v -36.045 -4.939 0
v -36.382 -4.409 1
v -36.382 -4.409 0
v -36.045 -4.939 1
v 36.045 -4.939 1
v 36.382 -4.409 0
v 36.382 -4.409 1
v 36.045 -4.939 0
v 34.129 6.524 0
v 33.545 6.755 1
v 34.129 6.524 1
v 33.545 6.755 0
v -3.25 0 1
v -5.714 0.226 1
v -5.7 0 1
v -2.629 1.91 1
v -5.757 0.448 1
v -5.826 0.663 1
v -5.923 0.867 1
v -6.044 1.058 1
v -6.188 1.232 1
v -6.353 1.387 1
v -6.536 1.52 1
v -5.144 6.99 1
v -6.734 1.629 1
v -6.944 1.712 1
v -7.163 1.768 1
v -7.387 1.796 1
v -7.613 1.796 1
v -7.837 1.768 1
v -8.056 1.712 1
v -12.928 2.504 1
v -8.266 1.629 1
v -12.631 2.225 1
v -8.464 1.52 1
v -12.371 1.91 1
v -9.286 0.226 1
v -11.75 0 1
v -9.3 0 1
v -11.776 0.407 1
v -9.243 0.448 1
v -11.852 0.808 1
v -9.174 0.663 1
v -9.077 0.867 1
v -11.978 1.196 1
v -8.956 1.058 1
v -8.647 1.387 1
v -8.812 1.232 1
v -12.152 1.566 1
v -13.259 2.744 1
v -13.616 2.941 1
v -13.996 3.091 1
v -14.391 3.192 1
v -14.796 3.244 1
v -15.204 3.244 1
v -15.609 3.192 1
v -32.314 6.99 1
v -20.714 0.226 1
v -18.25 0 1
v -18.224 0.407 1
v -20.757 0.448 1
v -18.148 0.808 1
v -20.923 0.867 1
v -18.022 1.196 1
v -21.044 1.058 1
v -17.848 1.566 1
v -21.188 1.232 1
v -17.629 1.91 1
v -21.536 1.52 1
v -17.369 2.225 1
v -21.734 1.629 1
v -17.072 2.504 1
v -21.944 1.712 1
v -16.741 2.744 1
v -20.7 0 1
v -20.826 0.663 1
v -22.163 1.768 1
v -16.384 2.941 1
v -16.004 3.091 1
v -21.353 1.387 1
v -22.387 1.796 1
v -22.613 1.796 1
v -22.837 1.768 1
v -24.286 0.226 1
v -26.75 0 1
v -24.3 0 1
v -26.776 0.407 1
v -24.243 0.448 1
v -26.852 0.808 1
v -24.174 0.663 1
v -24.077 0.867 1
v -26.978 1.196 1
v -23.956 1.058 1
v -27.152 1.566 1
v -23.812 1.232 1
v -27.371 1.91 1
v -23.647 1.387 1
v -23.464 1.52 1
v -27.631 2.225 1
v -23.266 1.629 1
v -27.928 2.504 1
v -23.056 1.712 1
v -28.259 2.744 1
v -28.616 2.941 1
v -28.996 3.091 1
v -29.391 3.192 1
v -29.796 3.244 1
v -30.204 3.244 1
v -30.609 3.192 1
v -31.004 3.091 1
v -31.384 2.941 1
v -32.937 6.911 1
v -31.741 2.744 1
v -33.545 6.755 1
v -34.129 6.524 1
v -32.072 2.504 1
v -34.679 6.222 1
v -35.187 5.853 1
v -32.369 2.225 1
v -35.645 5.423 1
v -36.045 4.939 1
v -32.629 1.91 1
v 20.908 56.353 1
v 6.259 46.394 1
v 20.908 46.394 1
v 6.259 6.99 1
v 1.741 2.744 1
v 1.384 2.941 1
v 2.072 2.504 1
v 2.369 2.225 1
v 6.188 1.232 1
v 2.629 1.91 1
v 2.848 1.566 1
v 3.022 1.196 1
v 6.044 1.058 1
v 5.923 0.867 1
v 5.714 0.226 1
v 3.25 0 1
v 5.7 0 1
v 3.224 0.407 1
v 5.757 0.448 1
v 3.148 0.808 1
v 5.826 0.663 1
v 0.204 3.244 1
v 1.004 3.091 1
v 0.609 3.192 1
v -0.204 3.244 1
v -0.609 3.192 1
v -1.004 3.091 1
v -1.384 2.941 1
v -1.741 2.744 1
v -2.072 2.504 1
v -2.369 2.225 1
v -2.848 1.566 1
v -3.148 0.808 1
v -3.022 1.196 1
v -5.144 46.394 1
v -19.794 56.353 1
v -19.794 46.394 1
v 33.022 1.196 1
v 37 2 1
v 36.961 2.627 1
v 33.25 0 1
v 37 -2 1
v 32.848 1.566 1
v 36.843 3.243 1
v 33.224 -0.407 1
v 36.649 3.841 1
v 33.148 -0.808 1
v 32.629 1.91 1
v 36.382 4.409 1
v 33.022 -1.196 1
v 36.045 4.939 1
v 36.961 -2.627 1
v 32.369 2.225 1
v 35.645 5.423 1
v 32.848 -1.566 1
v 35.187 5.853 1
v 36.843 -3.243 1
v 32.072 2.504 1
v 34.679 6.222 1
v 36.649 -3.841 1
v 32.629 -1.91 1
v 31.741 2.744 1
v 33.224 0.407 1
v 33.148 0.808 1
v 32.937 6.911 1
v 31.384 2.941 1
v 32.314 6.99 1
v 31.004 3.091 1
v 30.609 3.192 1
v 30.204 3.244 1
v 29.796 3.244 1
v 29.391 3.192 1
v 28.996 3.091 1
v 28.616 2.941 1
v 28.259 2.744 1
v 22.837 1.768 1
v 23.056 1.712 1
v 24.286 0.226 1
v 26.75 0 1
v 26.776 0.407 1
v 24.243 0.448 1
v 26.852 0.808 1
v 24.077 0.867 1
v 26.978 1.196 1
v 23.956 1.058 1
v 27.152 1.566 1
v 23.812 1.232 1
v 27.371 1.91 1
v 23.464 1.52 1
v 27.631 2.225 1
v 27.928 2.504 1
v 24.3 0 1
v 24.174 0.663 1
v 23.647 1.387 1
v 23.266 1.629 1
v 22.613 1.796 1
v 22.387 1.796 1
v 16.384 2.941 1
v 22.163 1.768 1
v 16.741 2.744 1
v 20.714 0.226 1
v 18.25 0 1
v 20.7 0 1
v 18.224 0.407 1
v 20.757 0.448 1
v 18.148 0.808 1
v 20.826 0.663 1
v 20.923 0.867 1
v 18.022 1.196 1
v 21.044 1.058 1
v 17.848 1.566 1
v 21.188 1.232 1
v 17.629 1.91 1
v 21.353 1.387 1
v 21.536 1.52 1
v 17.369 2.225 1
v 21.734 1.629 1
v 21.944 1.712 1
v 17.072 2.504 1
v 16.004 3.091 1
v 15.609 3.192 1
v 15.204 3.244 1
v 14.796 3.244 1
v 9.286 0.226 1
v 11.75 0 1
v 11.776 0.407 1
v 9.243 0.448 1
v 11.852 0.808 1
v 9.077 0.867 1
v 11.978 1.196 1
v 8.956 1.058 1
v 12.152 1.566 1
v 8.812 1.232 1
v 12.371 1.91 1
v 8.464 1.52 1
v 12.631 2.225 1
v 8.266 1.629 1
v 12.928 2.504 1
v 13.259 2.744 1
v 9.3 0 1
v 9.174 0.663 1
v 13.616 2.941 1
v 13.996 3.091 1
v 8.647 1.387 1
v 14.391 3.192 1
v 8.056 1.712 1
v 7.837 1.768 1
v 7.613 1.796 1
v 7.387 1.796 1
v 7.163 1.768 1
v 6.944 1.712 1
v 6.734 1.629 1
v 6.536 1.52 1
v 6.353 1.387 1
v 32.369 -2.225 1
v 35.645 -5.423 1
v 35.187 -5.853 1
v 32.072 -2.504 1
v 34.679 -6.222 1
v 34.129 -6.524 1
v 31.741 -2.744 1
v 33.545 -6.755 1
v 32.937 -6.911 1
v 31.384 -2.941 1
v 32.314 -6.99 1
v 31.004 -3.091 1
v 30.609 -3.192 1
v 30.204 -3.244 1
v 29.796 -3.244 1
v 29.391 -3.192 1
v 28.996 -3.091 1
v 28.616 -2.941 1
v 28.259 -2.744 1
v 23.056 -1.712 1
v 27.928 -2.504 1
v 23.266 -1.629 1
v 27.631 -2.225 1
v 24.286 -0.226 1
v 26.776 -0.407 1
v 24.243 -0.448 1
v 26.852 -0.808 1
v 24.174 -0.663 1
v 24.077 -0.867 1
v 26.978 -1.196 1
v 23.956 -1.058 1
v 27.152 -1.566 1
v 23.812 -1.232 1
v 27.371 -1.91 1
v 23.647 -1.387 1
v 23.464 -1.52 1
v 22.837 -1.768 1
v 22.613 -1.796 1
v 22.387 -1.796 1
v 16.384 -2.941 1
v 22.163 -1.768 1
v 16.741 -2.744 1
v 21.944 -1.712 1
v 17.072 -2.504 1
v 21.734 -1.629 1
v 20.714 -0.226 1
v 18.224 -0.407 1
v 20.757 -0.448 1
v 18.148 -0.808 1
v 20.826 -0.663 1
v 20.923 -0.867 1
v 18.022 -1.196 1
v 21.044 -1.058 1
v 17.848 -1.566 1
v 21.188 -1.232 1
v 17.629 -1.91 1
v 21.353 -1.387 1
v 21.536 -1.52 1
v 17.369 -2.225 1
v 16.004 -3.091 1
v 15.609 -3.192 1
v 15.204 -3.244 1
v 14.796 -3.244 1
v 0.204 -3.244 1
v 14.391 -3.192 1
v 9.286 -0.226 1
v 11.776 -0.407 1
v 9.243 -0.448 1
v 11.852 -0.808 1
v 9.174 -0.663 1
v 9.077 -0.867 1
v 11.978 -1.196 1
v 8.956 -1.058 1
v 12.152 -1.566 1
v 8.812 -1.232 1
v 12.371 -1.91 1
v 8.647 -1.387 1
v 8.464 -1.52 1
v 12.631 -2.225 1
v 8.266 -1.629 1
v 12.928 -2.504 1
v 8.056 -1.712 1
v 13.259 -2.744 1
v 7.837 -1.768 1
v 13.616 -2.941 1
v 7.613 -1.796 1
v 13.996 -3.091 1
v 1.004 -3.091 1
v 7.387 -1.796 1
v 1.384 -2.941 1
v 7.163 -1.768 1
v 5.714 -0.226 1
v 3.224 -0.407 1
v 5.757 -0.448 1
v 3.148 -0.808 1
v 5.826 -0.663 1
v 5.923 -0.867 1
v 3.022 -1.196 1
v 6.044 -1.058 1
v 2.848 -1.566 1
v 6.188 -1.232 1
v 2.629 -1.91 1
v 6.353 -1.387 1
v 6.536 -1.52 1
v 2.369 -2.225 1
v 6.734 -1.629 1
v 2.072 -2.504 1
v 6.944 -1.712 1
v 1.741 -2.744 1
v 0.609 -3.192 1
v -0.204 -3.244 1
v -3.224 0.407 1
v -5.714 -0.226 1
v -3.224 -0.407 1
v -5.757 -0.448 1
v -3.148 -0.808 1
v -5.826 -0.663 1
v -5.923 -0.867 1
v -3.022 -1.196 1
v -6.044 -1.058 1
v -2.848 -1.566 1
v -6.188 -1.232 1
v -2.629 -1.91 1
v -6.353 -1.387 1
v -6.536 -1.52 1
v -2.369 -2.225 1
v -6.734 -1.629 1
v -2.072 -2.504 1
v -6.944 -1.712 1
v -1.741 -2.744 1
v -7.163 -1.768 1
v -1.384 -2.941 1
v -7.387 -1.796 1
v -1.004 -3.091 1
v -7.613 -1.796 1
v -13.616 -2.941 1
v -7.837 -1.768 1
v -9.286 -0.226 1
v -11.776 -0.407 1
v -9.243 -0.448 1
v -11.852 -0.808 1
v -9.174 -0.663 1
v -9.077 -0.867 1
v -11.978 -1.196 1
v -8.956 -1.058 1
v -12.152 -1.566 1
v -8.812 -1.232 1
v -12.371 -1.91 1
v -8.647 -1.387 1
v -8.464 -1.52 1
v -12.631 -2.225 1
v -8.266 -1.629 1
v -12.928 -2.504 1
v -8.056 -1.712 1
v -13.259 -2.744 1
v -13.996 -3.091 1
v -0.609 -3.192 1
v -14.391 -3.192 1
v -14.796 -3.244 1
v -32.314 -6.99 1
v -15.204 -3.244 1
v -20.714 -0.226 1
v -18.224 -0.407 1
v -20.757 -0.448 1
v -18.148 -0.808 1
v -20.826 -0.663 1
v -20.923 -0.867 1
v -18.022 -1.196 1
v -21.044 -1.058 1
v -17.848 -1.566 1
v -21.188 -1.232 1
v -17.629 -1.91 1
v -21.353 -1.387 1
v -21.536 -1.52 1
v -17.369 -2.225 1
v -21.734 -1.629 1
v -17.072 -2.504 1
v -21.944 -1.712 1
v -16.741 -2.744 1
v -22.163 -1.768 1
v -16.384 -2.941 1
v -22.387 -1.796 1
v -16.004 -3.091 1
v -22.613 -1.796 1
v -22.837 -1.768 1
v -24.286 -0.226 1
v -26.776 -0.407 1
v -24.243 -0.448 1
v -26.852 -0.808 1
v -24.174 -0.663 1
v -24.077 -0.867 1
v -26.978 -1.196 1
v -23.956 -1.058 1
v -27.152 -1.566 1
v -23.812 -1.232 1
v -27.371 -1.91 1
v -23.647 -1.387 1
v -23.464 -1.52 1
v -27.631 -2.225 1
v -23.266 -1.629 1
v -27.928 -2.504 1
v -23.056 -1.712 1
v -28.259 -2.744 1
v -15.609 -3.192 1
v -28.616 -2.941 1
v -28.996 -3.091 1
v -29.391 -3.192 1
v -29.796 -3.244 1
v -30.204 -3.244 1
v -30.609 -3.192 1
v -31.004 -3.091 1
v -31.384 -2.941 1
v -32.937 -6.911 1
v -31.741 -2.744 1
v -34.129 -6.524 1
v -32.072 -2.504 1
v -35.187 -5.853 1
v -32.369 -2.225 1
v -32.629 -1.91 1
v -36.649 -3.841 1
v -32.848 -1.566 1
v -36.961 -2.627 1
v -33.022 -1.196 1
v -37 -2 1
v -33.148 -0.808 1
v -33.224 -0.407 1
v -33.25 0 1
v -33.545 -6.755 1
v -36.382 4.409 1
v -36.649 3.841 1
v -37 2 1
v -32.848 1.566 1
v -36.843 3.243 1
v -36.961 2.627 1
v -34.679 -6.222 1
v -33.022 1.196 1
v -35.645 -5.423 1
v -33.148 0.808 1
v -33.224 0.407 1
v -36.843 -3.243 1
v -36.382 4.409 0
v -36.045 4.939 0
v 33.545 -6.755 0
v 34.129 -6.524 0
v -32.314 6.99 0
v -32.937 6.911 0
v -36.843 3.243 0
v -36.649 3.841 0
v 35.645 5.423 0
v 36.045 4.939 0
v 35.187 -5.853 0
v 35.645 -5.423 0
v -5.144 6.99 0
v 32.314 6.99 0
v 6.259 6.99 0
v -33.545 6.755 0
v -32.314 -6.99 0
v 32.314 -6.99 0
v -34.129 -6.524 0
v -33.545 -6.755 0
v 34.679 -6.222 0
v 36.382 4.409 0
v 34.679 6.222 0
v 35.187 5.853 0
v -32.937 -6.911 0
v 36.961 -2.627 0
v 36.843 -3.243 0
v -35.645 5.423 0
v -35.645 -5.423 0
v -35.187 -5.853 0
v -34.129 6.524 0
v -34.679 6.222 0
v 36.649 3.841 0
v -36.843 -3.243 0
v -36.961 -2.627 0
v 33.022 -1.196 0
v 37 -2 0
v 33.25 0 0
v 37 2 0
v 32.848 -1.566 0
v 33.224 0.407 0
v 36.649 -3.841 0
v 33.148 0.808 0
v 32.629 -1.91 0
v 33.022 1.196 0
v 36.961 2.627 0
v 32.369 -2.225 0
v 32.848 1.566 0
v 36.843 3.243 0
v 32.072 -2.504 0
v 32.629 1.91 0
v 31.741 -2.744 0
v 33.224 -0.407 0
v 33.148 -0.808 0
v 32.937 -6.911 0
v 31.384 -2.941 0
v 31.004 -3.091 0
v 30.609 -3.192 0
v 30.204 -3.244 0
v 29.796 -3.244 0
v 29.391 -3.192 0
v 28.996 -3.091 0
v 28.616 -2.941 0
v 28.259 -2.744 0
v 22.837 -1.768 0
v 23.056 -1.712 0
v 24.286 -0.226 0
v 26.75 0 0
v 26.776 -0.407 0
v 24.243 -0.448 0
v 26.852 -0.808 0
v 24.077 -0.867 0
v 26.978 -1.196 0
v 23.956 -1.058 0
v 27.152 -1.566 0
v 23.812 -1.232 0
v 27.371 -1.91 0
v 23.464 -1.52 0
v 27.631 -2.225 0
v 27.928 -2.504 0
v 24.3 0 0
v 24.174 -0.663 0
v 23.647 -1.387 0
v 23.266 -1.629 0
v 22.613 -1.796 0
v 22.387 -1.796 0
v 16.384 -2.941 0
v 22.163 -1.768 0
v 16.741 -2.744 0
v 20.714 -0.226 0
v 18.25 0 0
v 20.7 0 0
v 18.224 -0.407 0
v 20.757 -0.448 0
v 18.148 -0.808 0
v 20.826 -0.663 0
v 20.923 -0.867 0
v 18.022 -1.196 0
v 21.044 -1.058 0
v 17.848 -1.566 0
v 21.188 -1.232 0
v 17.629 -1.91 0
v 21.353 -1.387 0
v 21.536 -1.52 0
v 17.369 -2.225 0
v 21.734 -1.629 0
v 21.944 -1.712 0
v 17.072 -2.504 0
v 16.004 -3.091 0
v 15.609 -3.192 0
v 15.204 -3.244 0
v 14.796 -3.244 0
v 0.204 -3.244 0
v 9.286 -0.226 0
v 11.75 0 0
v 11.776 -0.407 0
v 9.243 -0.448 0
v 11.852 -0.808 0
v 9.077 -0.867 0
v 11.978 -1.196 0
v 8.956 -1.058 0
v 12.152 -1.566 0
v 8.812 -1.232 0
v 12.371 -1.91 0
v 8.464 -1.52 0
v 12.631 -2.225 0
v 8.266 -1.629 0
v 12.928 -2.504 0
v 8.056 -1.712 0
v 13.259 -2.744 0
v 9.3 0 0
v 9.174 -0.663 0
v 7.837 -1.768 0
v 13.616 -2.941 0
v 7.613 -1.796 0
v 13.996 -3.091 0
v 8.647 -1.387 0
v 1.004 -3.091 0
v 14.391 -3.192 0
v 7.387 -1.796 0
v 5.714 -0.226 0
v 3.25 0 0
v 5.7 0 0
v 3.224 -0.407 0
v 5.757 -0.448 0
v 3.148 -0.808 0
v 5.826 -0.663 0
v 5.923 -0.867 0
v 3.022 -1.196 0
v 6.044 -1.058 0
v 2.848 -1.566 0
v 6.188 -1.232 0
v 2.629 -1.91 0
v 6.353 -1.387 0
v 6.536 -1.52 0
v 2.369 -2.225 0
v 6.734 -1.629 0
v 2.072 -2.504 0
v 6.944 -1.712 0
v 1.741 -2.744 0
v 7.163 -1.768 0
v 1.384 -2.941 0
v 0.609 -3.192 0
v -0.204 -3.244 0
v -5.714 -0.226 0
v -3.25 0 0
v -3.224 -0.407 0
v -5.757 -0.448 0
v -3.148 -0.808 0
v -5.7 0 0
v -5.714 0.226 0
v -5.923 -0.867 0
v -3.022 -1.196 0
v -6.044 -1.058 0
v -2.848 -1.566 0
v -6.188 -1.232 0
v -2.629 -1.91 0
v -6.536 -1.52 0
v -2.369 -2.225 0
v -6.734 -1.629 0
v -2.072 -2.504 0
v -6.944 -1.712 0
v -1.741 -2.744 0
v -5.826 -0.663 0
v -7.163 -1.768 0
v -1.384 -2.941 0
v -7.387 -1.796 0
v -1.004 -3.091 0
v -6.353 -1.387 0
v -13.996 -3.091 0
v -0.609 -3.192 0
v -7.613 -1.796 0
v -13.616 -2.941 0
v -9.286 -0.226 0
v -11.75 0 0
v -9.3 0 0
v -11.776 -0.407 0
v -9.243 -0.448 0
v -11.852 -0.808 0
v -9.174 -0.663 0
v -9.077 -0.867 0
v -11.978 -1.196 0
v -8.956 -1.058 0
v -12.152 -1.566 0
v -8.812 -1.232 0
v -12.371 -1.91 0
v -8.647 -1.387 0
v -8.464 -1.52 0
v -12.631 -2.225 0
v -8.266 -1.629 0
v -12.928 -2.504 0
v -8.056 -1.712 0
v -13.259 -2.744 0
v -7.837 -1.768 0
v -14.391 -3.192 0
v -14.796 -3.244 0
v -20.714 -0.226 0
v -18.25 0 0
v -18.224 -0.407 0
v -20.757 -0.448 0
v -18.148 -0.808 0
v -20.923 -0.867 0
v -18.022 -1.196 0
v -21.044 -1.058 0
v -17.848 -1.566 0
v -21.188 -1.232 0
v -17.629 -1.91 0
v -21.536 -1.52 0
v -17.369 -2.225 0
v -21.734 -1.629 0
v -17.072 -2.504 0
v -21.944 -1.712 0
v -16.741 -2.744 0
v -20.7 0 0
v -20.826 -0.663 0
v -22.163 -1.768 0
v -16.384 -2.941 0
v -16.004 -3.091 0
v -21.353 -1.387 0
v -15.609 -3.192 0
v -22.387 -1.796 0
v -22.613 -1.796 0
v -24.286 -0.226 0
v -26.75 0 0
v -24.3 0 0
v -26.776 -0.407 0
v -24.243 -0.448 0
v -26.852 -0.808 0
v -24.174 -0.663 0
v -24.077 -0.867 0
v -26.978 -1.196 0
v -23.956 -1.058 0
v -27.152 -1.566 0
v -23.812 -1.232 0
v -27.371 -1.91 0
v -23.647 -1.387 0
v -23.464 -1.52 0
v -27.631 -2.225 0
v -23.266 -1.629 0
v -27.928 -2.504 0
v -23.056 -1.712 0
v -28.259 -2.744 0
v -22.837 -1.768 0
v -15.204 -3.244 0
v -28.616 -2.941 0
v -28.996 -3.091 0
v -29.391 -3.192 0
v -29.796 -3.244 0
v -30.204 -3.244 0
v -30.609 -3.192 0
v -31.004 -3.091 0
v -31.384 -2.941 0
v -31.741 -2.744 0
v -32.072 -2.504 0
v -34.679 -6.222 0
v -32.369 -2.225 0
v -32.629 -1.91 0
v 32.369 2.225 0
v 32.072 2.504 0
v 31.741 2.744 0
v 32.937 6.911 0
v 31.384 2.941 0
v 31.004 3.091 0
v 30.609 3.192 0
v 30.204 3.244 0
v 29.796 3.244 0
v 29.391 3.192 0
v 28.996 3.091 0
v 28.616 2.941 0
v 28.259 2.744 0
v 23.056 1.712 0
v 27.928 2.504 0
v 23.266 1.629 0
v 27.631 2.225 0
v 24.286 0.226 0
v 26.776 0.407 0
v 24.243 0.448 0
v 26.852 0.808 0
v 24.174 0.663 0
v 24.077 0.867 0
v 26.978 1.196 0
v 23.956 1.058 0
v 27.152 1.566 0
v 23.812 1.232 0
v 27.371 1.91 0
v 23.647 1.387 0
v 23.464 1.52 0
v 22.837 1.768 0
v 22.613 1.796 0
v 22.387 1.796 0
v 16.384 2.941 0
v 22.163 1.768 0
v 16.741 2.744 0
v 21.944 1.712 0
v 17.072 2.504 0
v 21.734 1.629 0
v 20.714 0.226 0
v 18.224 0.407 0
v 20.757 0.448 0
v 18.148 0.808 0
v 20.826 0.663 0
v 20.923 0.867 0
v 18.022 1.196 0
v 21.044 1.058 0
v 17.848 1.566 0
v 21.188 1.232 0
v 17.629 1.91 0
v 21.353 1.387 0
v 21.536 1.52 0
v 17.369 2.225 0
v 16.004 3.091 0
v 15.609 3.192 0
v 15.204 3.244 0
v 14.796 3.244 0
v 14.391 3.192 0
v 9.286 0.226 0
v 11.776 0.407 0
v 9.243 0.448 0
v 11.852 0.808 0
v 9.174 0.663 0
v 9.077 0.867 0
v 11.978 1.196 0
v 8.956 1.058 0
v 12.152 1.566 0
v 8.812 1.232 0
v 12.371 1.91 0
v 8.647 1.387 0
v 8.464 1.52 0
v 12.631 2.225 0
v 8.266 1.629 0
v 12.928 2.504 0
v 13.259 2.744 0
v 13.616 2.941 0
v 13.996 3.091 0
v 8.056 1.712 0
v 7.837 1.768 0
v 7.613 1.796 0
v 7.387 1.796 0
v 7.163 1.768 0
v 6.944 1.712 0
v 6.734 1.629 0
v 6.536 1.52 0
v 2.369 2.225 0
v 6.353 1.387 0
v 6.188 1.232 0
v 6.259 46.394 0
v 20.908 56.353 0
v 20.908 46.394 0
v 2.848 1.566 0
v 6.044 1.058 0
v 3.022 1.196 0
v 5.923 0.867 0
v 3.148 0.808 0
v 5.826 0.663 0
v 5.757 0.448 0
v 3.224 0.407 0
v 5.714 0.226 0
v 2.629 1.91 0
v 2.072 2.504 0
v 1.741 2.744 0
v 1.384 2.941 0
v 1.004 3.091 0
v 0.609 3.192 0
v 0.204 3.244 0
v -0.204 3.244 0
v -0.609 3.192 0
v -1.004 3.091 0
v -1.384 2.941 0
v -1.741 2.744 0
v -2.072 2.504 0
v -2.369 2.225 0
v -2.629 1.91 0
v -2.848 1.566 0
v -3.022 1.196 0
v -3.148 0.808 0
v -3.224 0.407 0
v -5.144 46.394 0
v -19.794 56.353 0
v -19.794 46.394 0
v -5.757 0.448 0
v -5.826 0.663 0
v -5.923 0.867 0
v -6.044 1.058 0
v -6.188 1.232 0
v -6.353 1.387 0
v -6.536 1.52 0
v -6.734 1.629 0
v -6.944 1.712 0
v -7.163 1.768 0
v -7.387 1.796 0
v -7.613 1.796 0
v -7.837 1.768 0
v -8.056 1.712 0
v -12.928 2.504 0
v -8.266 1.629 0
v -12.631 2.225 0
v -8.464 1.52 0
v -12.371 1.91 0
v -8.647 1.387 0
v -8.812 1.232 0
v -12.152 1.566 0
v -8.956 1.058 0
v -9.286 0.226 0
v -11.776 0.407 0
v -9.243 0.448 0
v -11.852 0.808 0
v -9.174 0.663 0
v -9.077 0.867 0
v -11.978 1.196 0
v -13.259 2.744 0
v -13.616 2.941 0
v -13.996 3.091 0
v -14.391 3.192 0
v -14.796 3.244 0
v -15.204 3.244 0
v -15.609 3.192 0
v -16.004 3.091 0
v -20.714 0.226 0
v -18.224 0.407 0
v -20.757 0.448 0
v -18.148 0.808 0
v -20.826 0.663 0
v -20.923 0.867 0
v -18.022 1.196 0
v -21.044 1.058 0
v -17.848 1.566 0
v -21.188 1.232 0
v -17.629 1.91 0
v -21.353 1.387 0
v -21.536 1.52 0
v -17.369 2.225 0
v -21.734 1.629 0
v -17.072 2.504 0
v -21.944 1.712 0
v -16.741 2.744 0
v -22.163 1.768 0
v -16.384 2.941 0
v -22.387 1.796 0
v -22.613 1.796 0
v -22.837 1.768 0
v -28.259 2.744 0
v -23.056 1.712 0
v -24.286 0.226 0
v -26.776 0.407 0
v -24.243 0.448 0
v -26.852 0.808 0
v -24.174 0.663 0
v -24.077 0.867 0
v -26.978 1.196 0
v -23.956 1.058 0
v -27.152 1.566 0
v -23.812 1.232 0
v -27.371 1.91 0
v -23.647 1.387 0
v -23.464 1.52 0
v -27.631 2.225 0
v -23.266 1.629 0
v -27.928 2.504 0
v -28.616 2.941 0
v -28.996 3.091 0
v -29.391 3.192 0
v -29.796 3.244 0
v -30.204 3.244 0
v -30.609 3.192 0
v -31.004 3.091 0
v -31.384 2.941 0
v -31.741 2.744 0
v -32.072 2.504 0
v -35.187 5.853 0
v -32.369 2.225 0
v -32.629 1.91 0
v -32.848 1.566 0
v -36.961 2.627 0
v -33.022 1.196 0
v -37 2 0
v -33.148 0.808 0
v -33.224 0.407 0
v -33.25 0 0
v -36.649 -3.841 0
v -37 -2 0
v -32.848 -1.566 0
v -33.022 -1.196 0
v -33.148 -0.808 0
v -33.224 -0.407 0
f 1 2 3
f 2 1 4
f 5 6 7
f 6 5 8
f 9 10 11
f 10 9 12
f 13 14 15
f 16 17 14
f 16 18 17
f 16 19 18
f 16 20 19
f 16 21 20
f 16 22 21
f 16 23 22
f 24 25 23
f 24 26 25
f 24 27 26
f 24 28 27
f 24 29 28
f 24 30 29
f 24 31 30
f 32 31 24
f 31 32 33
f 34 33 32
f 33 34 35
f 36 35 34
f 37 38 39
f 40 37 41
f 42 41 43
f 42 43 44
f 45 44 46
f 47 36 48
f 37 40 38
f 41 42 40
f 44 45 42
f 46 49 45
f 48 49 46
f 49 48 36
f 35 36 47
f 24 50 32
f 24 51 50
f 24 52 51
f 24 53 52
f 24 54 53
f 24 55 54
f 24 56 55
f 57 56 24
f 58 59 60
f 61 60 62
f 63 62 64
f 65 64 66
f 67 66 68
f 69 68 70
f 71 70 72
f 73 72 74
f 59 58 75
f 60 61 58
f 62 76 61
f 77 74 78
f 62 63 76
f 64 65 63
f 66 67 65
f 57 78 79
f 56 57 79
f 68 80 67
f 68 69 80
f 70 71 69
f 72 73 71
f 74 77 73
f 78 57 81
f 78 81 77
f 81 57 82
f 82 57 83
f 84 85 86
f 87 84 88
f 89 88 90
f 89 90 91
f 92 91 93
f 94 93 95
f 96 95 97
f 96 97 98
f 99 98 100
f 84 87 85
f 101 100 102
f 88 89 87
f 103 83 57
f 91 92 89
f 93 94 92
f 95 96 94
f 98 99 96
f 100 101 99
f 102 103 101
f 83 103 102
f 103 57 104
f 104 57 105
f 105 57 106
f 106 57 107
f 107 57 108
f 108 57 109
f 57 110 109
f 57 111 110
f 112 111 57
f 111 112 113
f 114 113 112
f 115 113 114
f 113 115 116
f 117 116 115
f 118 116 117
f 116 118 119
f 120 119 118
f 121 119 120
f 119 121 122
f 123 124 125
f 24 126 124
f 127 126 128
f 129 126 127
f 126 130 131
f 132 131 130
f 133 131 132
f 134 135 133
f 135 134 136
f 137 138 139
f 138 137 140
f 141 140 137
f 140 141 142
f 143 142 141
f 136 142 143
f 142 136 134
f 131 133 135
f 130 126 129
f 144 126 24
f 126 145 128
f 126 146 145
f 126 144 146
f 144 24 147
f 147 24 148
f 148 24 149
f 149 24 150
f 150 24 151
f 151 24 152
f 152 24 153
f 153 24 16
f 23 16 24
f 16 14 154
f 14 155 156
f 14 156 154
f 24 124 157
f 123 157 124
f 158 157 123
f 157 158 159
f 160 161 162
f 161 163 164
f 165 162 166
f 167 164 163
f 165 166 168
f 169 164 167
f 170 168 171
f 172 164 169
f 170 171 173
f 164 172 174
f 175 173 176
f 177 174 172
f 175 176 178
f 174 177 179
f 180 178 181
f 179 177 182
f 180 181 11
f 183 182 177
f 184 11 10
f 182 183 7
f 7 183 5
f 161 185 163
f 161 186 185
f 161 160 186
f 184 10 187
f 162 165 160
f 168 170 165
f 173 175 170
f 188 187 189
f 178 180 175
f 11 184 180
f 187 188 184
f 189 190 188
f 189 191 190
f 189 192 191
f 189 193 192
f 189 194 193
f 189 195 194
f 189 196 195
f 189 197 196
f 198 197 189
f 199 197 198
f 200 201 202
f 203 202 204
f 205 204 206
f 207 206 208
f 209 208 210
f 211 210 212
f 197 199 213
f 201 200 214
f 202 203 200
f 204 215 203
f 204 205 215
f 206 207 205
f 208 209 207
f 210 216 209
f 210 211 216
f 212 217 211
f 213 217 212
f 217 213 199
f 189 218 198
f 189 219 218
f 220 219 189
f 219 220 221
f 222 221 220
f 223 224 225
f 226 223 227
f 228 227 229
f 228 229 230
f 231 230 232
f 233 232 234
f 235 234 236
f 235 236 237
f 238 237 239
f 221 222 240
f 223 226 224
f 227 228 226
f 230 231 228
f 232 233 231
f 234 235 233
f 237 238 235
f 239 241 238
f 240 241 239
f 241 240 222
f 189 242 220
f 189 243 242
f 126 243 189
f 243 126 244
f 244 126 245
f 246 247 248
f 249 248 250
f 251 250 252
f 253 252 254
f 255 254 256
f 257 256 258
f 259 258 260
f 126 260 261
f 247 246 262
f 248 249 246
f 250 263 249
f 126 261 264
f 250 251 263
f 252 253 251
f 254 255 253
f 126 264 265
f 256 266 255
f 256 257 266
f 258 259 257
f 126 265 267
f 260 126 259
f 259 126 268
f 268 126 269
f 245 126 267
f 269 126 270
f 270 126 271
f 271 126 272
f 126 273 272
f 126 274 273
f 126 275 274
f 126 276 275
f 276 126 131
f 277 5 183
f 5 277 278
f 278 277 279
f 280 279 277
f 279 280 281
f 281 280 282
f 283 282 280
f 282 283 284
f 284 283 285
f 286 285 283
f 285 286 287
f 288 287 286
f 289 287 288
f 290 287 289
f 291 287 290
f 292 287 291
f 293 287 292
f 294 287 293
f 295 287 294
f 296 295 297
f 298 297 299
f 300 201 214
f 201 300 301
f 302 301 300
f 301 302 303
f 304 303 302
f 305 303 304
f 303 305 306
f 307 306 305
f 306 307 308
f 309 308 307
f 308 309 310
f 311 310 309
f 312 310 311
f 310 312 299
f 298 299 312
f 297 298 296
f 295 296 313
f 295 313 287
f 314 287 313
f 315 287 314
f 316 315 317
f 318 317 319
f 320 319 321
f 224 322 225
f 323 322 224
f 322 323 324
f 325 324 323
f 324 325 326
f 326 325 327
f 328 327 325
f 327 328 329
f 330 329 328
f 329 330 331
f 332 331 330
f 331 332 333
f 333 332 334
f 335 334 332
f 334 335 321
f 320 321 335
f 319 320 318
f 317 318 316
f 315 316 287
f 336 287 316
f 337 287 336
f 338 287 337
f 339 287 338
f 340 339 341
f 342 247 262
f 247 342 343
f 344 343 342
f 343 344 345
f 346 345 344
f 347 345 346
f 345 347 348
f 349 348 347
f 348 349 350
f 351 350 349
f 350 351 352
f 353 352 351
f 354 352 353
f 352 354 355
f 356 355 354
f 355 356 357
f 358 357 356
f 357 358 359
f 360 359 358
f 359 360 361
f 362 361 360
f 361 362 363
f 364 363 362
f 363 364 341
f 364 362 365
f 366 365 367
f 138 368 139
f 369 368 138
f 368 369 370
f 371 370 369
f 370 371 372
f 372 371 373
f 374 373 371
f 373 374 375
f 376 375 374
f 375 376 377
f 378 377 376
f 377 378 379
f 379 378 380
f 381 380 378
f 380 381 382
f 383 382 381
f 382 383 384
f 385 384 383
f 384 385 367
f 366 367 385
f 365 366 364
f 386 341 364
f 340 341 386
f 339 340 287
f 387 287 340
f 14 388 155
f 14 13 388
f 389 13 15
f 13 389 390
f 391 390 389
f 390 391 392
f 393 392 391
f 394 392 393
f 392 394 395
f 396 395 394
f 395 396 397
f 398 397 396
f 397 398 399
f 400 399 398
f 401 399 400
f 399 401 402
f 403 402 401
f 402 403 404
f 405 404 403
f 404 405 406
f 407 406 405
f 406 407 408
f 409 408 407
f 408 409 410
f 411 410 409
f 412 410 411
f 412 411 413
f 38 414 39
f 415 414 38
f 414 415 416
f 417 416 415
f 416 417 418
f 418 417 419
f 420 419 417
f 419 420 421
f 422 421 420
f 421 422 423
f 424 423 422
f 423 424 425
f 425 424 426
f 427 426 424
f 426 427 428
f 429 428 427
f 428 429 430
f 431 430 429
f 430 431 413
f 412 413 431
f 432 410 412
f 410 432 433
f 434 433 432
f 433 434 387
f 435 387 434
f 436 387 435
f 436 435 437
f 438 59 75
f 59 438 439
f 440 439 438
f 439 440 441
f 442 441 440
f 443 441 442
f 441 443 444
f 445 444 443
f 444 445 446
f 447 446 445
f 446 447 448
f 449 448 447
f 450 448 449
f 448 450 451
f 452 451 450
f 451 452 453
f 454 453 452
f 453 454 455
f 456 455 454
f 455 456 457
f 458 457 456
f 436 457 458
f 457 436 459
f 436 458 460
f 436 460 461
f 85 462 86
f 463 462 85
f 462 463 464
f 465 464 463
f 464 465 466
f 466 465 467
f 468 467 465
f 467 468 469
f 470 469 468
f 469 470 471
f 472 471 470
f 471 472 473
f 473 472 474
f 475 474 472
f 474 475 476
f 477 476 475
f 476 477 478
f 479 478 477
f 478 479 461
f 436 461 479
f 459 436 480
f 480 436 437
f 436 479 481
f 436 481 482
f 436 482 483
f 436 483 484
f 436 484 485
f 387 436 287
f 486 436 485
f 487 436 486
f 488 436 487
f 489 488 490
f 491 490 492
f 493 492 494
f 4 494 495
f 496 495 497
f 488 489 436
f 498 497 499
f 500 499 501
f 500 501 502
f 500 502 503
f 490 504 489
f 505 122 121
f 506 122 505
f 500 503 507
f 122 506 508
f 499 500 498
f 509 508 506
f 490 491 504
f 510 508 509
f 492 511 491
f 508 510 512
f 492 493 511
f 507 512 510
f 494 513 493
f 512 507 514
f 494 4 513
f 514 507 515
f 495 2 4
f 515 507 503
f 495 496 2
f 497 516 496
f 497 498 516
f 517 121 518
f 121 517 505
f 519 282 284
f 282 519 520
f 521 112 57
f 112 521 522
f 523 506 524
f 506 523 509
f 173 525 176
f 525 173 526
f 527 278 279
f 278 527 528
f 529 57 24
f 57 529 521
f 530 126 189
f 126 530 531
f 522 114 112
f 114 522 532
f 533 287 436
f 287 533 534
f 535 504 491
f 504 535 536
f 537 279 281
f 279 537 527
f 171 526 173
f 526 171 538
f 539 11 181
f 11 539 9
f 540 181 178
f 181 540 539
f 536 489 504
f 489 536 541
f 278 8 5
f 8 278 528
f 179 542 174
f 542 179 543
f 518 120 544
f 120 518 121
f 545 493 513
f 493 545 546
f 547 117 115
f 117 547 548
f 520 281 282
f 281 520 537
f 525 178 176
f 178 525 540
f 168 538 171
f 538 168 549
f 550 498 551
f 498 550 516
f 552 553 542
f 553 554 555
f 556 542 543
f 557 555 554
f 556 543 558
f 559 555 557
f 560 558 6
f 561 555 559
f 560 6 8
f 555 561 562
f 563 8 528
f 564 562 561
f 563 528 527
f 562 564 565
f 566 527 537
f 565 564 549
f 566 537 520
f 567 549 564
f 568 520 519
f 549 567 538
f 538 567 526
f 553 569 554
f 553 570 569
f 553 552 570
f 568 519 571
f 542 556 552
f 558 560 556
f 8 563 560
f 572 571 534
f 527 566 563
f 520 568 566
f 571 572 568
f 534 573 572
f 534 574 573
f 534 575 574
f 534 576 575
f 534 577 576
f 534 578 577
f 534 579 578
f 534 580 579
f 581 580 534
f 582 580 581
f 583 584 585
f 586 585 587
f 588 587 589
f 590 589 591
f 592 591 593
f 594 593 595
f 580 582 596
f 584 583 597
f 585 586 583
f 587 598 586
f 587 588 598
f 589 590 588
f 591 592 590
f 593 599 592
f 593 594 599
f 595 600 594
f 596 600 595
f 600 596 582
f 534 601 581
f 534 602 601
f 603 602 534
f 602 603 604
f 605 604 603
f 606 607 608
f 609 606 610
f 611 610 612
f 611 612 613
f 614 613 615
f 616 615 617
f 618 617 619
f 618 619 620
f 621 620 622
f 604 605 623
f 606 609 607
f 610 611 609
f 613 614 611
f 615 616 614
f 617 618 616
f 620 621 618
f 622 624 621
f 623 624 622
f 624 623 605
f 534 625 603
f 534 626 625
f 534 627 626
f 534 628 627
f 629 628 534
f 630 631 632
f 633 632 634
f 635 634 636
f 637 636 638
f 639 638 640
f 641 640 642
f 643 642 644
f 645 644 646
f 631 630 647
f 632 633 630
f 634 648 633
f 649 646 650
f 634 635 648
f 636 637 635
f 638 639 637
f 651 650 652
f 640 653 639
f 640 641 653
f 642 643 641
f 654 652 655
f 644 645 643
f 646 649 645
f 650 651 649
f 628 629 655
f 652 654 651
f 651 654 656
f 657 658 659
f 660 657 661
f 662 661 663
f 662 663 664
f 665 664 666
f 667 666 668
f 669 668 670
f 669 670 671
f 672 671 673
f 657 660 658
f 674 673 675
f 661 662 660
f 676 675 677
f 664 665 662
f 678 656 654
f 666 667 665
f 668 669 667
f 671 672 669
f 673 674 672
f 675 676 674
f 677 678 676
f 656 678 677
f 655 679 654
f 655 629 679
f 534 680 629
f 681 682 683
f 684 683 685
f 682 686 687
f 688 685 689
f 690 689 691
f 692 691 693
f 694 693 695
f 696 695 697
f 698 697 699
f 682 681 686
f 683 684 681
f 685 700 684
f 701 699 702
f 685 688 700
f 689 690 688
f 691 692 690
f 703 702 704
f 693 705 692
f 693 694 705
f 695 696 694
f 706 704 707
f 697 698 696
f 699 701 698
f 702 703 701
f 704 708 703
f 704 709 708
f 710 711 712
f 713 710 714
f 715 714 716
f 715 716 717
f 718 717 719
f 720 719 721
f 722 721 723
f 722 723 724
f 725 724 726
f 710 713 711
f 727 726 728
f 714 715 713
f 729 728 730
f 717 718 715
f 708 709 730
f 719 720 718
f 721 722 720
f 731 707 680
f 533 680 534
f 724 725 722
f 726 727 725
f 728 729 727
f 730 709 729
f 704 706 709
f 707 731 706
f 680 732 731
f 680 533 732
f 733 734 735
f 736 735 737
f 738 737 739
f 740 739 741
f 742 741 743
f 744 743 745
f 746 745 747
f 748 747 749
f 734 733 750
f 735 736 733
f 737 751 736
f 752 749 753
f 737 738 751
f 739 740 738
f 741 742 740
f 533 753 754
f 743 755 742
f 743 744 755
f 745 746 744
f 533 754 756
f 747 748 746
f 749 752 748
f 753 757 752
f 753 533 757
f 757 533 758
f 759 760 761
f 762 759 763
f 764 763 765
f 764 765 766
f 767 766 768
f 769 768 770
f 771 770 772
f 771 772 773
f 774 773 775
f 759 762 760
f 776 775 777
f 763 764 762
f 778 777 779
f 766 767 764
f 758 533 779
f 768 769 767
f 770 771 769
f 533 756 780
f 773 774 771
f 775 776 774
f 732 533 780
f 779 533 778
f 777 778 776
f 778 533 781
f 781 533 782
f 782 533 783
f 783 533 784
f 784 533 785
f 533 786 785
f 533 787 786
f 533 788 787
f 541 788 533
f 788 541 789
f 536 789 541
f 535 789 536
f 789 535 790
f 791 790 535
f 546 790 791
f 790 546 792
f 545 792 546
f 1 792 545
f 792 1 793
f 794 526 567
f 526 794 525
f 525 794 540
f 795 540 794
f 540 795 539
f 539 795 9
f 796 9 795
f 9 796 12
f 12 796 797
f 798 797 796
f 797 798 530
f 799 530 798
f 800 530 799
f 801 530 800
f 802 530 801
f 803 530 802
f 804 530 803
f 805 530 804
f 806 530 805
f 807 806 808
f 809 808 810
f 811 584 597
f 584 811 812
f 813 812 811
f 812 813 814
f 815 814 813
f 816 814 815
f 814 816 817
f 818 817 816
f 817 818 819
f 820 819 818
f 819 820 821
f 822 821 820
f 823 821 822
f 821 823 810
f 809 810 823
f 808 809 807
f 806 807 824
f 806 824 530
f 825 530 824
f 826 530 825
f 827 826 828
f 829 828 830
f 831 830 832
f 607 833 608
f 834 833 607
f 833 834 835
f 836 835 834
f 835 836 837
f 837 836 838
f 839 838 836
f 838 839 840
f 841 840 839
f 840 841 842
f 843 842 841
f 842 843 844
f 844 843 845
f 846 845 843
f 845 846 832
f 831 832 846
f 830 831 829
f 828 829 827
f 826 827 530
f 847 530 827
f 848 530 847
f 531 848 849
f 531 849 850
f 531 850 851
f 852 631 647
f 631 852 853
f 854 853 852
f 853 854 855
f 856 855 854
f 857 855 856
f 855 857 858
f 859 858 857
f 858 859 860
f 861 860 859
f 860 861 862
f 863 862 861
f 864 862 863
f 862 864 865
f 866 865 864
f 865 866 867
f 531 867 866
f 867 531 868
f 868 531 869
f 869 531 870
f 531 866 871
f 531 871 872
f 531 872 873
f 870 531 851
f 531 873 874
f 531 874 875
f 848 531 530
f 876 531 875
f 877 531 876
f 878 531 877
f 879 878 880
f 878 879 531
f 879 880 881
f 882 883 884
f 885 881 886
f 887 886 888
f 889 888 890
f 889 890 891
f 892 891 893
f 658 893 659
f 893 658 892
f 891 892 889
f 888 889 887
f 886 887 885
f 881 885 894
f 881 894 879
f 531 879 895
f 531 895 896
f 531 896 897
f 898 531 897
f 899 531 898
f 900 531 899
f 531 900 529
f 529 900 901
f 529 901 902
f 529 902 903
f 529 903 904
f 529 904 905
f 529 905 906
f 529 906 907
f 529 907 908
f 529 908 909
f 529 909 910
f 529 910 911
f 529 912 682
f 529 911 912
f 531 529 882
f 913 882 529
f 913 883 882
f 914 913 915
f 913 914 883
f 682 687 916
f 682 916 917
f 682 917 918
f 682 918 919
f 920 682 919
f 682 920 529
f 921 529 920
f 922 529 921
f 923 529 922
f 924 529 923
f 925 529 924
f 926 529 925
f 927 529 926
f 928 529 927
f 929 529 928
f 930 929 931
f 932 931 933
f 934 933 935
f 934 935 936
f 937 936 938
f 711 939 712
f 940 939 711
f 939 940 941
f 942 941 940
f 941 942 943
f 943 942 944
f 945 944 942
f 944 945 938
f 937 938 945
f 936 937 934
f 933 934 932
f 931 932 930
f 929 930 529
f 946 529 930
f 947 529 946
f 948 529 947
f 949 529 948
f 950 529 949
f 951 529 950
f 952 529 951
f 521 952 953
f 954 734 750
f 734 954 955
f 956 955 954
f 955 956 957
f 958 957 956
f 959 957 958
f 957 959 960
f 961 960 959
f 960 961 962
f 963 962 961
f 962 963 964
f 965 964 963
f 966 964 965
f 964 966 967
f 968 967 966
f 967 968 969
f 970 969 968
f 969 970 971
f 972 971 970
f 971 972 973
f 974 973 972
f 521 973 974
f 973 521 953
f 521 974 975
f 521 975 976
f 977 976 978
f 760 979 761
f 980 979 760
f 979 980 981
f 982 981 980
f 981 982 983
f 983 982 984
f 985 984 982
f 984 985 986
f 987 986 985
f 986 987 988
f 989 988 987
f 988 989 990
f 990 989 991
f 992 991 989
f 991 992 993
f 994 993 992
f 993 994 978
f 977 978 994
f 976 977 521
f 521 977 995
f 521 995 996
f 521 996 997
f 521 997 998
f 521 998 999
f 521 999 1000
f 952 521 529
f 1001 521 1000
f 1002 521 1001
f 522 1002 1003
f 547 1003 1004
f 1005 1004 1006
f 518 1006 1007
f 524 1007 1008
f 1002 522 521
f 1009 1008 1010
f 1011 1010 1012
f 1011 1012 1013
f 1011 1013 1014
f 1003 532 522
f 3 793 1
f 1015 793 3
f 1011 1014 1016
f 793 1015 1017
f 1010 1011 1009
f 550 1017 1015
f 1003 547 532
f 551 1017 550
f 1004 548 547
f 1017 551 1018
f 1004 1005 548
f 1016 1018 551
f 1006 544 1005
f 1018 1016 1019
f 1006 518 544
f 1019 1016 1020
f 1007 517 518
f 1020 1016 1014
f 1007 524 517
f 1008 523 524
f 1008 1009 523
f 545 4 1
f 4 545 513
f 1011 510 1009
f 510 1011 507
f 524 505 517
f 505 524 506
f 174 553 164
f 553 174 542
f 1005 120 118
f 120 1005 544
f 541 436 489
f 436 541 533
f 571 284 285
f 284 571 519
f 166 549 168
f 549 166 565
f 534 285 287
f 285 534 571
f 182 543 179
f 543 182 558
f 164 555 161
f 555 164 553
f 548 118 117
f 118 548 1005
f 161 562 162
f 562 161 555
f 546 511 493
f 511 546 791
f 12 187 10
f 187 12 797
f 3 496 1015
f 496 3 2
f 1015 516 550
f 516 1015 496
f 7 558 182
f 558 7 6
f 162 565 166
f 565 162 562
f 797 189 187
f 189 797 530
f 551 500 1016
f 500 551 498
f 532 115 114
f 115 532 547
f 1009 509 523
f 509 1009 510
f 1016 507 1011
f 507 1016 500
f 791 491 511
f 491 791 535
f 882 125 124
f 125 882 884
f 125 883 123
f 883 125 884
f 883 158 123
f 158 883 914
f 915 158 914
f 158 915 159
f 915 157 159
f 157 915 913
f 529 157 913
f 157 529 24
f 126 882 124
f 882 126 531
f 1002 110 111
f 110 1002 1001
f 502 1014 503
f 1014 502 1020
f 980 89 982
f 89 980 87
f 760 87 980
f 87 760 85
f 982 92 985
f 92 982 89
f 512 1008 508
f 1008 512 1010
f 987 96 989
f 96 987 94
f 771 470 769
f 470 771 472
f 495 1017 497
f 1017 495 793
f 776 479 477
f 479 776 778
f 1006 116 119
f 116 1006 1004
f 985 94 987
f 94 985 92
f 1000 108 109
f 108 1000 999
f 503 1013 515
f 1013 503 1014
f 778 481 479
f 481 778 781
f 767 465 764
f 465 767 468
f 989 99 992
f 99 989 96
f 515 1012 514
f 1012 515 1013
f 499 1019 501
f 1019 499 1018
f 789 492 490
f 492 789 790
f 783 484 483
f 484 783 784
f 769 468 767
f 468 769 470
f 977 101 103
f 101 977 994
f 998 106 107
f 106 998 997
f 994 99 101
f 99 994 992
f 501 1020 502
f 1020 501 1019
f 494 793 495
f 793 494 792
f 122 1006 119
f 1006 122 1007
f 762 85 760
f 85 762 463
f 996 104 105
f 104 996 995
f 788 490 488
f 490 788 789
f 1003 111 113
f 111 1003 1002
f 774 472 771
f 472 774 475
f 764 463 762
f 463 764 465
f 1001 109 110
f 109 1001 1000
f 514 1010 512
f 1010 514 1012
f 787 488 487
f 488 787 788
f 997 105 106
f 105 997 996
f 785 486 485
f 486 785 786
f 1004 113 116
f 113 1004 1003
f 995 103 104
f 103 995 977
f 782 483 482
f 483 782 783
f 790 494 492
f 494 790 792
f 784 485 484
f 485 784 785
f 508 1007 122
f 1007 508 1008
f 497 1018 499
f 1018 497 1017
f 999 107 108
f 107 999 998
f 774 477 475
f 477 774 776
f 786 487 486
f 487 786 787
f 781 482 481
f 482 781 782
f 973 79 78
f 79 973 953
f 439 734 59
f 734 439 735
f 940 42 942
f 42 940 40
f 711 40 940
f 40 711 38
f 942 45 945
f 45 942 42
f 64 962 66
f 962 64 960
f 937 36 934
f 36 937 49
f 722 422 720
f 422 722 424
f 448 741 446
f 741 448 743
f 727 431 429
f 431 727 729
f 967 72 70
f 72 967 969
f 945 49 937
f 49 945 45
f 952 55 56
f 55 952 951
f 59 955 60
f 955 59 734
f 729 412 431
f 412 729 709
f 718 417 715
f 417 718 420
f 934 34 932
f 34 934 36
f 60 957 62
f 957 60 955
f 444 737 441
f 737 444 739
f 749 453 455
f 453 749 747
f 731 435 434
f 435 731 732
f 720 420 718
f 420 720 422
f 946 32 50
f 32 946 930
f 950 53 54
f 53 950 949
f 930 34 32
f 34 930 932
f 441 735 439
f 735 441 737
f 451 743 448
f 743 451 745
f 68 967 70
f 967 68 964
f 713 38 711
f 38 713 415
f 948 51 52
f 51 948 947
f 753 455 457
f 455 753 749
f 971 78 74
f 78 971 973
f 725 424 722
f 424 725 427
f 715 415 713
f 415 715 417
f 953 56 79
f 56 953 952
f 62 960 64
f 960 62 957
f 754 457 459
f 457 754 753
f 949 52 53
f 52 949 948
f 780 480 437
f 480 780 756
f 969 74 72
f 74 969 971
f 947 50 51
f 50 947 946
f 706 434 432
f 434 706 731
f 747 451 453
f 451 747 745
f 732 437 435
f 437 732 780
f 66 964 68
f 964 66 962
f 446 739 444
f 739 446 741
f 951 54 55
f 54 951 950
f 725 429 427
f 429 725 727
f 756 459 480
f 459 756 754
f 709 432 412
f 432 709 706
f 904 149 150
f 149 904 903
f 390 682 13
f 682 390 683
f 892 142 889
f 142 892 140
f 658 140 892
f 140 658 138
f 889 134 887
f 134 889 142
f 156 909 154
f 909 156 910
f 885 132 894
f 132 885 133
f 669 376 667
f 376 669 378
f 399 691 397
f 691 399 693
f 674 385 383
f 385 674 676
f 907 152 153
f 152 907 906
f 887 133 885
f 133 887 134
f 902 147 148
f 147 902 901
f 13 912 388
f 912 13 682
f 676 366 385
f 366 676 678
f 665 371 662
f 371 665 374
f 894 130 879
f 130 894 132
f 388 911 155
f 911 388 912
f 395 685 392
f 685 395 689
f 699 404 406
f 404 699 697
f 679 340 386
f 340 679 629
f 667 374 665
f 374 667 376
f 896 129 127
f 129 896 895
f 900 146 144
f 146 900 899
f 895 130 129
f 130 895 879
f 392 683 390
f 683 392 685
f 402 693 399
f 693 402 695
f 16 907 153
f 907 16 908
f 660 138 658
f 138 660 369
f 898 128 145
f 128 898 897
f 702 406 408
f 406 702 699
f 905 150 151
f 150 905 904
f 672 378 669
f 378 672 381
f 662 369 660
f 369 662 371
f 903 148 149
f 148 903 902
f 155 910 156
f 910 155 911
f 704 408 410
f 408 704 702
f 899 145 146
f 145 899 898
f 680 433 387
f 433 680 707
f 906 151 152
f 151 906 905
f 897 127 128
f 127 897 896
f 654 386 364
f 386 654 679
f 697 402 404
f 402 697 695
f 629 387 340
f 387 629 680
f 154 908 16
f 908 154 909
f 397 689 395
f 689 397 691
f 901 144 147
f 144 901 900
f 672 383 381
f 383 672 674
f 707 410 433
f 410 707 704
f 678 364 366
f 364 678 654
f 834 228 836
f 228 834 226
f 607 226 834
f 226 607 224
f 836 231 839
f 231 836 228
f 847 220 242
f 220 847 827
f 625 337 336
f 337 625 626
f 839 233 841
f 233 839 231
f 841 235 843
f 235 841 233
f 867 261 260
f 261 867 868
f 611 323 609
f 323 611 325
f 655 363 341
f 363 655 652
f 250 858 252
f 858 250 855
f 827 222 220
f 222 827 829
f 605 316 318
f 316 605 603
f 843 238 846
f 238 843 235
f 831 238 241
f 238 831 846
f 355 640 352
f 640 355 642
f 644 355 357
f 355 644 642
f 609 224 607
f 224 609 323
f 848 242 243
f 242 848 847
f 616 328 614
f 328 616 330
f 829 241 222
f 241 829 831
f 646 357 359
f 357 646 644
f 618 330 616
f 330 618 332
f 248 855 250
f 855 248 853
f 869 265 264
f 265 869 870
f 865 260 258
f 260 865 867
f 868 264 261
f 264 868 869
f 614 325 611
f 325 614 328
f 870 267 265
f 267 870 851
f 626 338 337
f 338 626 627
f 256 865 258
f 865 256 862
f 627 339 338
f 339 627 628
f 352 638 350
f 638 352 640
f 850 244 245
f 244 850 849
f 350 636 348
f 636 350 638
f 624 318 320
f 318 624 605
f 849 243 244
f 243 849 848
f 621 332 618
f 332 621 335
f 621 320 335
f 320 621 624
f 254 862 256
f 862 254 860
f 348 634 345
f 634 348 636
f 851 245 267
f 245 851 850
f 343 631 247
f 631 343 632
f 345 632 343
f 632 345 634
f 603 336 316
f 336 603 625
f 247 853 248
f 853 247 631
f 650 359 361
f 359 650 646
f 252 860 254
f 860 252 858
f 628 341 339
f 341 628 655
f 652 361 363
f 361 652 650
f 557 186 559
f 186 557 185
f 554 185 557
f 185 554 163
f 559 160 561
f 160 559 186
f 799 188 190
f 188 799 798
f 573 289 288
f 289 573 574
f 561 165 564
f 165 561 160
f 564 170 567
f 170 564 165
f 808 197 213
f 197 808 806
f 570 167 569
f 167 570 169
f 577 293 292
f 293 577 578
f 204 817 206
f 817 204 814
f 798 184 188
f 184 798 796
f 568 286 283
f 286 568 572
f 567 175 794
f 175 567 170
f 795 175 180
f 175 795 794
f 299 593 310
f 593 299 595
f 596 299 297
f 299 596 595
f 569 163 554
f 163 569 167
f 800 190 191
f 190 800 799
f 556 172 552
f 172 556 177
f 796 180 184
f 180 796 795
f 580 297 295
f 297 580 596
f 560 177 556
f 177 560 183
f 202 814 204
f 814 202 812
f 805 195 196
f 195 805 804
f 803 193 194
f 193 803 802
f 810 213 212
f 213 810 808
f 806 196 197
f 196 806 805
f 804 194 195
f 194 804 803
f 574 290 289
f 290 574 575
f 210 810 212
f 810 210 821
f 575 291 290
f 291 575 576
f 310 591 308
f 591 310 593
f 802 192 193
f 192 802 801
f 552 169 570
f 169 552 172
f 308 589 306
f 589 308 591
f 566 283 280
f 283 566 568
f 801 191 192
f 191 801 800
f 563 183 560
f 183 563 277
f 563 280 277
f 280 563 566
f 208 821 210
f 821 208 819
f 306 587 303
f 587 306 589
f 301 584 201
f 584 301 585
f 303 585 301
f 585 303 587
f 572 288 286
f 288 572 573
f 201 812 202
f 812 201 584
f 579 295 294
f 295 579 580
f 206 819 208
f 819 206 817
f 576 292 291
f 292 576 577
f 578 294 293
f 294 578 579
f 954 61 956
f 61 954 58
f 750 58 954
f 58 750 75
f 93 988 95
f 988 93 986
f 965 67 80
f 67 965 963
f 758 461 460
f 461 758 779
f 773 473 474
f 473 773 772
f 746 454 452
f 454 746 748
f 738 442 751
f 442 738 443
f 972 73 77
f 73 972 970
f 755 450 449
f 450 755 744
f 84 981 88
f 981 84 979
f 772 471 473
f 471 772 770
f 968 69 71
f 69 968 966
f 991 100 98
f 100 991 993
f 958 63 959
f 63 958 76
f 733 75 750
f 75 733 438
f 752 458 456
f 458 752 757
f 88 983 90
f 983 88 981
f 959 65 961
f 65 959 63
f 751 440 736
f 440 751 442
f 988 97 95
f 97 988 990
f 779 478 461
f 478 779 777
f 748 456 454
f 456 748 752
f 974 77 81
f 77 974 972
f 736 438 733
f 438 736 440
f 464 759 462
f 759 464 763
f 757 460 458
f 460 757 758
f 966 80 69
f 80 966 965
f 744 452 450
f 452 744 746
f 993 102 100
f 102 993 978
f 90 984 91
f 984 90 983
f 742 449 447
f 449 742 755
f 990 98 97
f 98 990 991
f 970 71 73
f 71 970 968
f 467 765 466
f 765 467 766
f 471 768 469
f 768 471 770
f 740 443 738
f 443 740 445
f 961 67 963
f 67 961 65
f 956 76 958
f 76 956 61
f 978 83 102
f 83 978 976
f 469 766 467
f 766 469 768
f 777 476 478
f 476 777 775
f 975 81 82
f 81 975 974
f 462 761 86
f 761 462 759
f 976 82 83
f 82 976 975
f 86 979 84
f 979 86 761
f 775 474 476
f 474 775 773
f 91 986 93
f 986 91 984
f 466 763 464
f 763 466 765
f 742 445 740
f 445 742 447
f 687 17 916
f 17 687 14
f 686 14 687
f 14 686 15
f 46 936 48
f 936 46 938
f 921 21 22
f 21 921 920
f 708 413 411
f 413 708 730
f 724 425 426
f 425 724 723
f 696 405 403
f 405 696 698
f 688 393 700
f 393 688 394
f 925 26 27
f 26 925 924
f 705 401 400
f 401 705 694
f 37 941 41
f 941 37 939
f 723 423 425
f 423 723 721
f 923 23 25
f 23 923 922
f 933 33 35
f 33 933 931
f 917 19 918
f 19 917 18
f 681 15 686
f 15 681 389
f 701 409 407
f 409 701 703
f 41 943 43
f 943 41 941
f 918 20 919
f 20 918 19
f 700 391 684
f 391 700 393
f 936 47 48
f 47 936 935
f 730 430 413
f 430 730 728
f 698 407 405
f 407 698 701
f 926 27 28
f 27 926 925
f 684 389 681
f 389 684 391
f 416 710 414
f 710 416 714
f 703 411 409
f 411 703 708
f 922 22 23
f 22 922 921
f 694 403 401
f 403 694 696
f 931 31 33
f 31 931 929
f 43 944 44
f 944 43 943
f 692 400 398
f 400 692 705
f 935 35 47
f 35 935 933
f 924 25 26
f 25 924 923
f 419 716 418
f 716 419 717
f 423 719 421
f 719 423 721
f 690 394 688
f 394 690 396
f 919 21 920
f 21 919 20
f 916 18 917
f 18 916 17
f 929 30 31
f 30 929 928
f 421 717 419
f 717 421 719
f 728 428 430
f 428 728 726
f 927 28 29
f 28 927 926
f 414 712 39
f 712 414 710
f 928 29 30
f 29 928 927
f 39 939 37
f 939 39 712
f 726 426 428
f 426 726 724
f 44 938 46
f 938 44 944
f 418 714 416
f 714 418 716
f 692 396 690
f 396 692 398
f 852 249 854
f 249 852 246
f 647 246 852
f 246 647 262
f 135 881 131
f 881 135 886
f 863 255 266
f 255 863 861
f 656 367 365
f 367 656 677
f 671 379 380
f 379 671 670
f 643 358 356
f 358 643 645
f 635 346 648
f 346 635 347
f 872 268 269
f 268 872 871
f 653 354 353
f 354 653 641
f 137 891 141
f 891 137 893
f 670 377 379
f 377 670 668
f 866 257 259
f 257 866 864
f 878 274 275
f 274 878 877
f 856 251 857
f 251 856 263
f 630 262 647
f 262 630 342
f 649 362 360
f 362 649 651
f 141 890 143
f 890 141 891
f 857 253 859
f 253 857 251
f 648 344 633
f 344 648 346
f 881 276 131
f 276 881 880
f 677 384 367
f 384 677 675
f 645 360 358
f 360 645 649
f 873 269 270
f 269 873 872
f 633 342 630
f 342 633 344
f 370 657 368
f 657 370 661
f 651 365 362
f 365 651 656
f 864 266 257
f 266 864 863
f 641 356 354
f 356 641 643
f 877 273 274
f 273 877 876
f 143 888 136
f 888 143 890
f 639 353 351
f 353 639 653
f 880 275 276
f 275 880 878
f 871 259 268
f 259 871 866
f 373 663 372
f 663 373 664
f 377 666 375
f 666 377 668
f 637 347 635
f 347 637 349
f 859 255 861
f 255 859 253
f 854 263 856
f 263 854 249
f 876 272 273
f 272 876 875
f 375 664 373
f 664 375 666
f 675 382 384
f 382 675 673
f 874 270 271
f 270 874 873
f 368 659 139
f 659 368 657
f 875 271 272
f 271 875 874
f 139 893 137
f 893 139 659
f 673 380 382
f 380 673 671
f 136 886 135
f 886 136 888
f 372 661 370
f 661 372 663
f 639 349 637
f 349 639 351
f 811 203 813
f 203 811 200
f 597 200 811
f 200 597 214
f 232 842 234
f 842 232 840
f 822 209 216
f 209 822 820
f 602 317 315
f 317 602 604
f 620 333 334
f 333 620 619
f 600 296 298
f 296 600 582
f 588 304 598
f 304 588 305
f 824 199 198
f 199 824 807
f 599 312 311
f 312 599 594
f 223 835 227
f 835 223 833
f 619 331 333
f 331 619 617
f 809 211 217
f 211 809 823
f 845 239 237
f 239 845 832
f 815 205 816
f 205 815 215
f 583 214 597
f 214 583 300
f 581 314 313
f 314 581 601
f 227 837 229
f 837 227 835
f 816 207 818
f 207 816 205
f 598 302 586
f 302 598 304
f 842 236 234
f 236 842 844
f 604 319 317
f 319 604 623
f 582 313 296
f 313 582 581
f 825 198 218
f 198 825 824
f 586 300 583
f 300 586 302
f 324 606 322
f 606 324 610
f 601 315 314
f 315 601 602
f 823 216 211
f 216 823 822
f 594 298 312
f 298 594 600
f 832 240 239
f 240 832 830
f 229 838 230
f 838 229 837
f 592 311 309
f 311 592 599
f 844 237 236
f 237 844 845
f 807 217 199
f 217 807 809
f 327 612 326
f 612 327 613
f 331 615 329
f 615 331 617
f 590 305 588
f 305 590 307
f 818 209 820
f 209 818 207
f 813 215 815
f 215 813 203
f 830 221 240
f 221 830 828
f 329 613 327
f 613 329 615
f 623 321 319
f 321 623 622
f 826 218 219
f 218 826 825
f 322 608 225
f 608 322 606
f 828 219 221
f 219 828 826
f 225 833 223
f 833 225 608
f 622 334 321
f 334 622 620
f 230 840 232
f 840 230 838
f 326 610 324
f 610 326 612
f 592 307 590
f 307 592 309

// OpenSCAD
$fn = 50;


difference() {
	union() {
		hull() {
			translate(v = [-32.0000000000, 2.0000000000, 0]) {
				cylinder(h = 1, r = 5);
			}
			translate(v = [32.0000000000, 2.0000000000, 0]) {
				cylinder(h = 1, r = 5);
			}
			translate(v = [-32.0000000000, -2.0000000000, 0]) {
				cylinder(h = 1, r = 5);
			}
			translate(v = [32.0000000000, -2.0000000000, 0]) {
				cylinder(h = 1, r = 5);
			}
		}
		translate(v = [0, 55, 0]) {
			linear_extrude(height = 1) {
				text(font = "DejaVu Sans Mono:style=Bold", halign = "center", size = 57.0000000000, text = "T", valign = "top");
			}
		}
	}
	union() {
		translate(v = [-30.0000000000, 0.0000000000, 0]) {
			translate(v = [0, 0, -100]) {
				cylinder(h = 200, r = 3.2500000000);
			}
		}
		translate(v = [-15.0000000000, 0.0000000000, 0]) {
			translate(v = [0, 0, -100]) {
				cylinder(h = 200, r = 3.2500000000);
			}
		}
		translate(v = [0, 0, -100]) {
			cylinder(h = 200, r = 3.2500000000);
		}
		translate(v = [15.0000000000, 0.0000000000, 0]) {
			translate(v = [0, 0, -100]) {
				cylinder(h = 200, r = 3.2500000000);
			}
		}
		translate(v = [30.0000000000, 0.0000000000, 0]) {
			translate(v = [0, 0, -100]) {
				cylinder(h = 200, r = 3.2500000000);
			}
		}
		translate(v = [-30.0000000000, 0.0000000000, 0]) {
			translate(v = [0, 0, -100]) {
				cylinder(h = 200, r = 1.8000000000);
			}
		}
		translate(v = [-22.5000000000, 0.0000000000, 0]) {
			translate(v = [0, 0, -100]) {
				cylinder(h = 200, r = 1.8000000000);
			}
		}
		translate(v = [-15.0000000000, 0.0000000000, 0]) {
			translate(v = [0, 0, -100]) {
				cylinder(h = 200, r = 1.8000000000);
			}
		}
		translate(v = [-7.5000000000, 0.0000000000, 0]) {
			translate(v = [0, 0, -100]) {
				cylinder(h = 200, r = 1.8000000000);
			}
		}
		translate(v = [0, 0, -100]) {
			cylinder(h = 200, r = 1.8000000000);
		}
		translate(v = [7.5000000000, 0.0000000000, 0]) {
			translate(v = [0, 0, -100]) {
				cylinder(h = 200, r = 1.8000000000);
			}
		}
		translate(v = [15.0000000000, 0.0000000000, 0]) {
			translate(v = [0, 0, -100]) {
				cylinder(h = 200, r = 1.8000000000);
			}
		}
		translate(v = [22.5000000000, 0.0000000000, 0]) {
			translate(v = [0, 0, -100]) {
				cylinder(h = 200, r = 1.8000000000);
			}
		}
		translate(v = [30.0000000000, 0.0000000000, 0]) {
			translate(v = [0, 0, -100]) {
				cylinder(h = 200, r = 1.8000000000);
			}
		}
	}
}
